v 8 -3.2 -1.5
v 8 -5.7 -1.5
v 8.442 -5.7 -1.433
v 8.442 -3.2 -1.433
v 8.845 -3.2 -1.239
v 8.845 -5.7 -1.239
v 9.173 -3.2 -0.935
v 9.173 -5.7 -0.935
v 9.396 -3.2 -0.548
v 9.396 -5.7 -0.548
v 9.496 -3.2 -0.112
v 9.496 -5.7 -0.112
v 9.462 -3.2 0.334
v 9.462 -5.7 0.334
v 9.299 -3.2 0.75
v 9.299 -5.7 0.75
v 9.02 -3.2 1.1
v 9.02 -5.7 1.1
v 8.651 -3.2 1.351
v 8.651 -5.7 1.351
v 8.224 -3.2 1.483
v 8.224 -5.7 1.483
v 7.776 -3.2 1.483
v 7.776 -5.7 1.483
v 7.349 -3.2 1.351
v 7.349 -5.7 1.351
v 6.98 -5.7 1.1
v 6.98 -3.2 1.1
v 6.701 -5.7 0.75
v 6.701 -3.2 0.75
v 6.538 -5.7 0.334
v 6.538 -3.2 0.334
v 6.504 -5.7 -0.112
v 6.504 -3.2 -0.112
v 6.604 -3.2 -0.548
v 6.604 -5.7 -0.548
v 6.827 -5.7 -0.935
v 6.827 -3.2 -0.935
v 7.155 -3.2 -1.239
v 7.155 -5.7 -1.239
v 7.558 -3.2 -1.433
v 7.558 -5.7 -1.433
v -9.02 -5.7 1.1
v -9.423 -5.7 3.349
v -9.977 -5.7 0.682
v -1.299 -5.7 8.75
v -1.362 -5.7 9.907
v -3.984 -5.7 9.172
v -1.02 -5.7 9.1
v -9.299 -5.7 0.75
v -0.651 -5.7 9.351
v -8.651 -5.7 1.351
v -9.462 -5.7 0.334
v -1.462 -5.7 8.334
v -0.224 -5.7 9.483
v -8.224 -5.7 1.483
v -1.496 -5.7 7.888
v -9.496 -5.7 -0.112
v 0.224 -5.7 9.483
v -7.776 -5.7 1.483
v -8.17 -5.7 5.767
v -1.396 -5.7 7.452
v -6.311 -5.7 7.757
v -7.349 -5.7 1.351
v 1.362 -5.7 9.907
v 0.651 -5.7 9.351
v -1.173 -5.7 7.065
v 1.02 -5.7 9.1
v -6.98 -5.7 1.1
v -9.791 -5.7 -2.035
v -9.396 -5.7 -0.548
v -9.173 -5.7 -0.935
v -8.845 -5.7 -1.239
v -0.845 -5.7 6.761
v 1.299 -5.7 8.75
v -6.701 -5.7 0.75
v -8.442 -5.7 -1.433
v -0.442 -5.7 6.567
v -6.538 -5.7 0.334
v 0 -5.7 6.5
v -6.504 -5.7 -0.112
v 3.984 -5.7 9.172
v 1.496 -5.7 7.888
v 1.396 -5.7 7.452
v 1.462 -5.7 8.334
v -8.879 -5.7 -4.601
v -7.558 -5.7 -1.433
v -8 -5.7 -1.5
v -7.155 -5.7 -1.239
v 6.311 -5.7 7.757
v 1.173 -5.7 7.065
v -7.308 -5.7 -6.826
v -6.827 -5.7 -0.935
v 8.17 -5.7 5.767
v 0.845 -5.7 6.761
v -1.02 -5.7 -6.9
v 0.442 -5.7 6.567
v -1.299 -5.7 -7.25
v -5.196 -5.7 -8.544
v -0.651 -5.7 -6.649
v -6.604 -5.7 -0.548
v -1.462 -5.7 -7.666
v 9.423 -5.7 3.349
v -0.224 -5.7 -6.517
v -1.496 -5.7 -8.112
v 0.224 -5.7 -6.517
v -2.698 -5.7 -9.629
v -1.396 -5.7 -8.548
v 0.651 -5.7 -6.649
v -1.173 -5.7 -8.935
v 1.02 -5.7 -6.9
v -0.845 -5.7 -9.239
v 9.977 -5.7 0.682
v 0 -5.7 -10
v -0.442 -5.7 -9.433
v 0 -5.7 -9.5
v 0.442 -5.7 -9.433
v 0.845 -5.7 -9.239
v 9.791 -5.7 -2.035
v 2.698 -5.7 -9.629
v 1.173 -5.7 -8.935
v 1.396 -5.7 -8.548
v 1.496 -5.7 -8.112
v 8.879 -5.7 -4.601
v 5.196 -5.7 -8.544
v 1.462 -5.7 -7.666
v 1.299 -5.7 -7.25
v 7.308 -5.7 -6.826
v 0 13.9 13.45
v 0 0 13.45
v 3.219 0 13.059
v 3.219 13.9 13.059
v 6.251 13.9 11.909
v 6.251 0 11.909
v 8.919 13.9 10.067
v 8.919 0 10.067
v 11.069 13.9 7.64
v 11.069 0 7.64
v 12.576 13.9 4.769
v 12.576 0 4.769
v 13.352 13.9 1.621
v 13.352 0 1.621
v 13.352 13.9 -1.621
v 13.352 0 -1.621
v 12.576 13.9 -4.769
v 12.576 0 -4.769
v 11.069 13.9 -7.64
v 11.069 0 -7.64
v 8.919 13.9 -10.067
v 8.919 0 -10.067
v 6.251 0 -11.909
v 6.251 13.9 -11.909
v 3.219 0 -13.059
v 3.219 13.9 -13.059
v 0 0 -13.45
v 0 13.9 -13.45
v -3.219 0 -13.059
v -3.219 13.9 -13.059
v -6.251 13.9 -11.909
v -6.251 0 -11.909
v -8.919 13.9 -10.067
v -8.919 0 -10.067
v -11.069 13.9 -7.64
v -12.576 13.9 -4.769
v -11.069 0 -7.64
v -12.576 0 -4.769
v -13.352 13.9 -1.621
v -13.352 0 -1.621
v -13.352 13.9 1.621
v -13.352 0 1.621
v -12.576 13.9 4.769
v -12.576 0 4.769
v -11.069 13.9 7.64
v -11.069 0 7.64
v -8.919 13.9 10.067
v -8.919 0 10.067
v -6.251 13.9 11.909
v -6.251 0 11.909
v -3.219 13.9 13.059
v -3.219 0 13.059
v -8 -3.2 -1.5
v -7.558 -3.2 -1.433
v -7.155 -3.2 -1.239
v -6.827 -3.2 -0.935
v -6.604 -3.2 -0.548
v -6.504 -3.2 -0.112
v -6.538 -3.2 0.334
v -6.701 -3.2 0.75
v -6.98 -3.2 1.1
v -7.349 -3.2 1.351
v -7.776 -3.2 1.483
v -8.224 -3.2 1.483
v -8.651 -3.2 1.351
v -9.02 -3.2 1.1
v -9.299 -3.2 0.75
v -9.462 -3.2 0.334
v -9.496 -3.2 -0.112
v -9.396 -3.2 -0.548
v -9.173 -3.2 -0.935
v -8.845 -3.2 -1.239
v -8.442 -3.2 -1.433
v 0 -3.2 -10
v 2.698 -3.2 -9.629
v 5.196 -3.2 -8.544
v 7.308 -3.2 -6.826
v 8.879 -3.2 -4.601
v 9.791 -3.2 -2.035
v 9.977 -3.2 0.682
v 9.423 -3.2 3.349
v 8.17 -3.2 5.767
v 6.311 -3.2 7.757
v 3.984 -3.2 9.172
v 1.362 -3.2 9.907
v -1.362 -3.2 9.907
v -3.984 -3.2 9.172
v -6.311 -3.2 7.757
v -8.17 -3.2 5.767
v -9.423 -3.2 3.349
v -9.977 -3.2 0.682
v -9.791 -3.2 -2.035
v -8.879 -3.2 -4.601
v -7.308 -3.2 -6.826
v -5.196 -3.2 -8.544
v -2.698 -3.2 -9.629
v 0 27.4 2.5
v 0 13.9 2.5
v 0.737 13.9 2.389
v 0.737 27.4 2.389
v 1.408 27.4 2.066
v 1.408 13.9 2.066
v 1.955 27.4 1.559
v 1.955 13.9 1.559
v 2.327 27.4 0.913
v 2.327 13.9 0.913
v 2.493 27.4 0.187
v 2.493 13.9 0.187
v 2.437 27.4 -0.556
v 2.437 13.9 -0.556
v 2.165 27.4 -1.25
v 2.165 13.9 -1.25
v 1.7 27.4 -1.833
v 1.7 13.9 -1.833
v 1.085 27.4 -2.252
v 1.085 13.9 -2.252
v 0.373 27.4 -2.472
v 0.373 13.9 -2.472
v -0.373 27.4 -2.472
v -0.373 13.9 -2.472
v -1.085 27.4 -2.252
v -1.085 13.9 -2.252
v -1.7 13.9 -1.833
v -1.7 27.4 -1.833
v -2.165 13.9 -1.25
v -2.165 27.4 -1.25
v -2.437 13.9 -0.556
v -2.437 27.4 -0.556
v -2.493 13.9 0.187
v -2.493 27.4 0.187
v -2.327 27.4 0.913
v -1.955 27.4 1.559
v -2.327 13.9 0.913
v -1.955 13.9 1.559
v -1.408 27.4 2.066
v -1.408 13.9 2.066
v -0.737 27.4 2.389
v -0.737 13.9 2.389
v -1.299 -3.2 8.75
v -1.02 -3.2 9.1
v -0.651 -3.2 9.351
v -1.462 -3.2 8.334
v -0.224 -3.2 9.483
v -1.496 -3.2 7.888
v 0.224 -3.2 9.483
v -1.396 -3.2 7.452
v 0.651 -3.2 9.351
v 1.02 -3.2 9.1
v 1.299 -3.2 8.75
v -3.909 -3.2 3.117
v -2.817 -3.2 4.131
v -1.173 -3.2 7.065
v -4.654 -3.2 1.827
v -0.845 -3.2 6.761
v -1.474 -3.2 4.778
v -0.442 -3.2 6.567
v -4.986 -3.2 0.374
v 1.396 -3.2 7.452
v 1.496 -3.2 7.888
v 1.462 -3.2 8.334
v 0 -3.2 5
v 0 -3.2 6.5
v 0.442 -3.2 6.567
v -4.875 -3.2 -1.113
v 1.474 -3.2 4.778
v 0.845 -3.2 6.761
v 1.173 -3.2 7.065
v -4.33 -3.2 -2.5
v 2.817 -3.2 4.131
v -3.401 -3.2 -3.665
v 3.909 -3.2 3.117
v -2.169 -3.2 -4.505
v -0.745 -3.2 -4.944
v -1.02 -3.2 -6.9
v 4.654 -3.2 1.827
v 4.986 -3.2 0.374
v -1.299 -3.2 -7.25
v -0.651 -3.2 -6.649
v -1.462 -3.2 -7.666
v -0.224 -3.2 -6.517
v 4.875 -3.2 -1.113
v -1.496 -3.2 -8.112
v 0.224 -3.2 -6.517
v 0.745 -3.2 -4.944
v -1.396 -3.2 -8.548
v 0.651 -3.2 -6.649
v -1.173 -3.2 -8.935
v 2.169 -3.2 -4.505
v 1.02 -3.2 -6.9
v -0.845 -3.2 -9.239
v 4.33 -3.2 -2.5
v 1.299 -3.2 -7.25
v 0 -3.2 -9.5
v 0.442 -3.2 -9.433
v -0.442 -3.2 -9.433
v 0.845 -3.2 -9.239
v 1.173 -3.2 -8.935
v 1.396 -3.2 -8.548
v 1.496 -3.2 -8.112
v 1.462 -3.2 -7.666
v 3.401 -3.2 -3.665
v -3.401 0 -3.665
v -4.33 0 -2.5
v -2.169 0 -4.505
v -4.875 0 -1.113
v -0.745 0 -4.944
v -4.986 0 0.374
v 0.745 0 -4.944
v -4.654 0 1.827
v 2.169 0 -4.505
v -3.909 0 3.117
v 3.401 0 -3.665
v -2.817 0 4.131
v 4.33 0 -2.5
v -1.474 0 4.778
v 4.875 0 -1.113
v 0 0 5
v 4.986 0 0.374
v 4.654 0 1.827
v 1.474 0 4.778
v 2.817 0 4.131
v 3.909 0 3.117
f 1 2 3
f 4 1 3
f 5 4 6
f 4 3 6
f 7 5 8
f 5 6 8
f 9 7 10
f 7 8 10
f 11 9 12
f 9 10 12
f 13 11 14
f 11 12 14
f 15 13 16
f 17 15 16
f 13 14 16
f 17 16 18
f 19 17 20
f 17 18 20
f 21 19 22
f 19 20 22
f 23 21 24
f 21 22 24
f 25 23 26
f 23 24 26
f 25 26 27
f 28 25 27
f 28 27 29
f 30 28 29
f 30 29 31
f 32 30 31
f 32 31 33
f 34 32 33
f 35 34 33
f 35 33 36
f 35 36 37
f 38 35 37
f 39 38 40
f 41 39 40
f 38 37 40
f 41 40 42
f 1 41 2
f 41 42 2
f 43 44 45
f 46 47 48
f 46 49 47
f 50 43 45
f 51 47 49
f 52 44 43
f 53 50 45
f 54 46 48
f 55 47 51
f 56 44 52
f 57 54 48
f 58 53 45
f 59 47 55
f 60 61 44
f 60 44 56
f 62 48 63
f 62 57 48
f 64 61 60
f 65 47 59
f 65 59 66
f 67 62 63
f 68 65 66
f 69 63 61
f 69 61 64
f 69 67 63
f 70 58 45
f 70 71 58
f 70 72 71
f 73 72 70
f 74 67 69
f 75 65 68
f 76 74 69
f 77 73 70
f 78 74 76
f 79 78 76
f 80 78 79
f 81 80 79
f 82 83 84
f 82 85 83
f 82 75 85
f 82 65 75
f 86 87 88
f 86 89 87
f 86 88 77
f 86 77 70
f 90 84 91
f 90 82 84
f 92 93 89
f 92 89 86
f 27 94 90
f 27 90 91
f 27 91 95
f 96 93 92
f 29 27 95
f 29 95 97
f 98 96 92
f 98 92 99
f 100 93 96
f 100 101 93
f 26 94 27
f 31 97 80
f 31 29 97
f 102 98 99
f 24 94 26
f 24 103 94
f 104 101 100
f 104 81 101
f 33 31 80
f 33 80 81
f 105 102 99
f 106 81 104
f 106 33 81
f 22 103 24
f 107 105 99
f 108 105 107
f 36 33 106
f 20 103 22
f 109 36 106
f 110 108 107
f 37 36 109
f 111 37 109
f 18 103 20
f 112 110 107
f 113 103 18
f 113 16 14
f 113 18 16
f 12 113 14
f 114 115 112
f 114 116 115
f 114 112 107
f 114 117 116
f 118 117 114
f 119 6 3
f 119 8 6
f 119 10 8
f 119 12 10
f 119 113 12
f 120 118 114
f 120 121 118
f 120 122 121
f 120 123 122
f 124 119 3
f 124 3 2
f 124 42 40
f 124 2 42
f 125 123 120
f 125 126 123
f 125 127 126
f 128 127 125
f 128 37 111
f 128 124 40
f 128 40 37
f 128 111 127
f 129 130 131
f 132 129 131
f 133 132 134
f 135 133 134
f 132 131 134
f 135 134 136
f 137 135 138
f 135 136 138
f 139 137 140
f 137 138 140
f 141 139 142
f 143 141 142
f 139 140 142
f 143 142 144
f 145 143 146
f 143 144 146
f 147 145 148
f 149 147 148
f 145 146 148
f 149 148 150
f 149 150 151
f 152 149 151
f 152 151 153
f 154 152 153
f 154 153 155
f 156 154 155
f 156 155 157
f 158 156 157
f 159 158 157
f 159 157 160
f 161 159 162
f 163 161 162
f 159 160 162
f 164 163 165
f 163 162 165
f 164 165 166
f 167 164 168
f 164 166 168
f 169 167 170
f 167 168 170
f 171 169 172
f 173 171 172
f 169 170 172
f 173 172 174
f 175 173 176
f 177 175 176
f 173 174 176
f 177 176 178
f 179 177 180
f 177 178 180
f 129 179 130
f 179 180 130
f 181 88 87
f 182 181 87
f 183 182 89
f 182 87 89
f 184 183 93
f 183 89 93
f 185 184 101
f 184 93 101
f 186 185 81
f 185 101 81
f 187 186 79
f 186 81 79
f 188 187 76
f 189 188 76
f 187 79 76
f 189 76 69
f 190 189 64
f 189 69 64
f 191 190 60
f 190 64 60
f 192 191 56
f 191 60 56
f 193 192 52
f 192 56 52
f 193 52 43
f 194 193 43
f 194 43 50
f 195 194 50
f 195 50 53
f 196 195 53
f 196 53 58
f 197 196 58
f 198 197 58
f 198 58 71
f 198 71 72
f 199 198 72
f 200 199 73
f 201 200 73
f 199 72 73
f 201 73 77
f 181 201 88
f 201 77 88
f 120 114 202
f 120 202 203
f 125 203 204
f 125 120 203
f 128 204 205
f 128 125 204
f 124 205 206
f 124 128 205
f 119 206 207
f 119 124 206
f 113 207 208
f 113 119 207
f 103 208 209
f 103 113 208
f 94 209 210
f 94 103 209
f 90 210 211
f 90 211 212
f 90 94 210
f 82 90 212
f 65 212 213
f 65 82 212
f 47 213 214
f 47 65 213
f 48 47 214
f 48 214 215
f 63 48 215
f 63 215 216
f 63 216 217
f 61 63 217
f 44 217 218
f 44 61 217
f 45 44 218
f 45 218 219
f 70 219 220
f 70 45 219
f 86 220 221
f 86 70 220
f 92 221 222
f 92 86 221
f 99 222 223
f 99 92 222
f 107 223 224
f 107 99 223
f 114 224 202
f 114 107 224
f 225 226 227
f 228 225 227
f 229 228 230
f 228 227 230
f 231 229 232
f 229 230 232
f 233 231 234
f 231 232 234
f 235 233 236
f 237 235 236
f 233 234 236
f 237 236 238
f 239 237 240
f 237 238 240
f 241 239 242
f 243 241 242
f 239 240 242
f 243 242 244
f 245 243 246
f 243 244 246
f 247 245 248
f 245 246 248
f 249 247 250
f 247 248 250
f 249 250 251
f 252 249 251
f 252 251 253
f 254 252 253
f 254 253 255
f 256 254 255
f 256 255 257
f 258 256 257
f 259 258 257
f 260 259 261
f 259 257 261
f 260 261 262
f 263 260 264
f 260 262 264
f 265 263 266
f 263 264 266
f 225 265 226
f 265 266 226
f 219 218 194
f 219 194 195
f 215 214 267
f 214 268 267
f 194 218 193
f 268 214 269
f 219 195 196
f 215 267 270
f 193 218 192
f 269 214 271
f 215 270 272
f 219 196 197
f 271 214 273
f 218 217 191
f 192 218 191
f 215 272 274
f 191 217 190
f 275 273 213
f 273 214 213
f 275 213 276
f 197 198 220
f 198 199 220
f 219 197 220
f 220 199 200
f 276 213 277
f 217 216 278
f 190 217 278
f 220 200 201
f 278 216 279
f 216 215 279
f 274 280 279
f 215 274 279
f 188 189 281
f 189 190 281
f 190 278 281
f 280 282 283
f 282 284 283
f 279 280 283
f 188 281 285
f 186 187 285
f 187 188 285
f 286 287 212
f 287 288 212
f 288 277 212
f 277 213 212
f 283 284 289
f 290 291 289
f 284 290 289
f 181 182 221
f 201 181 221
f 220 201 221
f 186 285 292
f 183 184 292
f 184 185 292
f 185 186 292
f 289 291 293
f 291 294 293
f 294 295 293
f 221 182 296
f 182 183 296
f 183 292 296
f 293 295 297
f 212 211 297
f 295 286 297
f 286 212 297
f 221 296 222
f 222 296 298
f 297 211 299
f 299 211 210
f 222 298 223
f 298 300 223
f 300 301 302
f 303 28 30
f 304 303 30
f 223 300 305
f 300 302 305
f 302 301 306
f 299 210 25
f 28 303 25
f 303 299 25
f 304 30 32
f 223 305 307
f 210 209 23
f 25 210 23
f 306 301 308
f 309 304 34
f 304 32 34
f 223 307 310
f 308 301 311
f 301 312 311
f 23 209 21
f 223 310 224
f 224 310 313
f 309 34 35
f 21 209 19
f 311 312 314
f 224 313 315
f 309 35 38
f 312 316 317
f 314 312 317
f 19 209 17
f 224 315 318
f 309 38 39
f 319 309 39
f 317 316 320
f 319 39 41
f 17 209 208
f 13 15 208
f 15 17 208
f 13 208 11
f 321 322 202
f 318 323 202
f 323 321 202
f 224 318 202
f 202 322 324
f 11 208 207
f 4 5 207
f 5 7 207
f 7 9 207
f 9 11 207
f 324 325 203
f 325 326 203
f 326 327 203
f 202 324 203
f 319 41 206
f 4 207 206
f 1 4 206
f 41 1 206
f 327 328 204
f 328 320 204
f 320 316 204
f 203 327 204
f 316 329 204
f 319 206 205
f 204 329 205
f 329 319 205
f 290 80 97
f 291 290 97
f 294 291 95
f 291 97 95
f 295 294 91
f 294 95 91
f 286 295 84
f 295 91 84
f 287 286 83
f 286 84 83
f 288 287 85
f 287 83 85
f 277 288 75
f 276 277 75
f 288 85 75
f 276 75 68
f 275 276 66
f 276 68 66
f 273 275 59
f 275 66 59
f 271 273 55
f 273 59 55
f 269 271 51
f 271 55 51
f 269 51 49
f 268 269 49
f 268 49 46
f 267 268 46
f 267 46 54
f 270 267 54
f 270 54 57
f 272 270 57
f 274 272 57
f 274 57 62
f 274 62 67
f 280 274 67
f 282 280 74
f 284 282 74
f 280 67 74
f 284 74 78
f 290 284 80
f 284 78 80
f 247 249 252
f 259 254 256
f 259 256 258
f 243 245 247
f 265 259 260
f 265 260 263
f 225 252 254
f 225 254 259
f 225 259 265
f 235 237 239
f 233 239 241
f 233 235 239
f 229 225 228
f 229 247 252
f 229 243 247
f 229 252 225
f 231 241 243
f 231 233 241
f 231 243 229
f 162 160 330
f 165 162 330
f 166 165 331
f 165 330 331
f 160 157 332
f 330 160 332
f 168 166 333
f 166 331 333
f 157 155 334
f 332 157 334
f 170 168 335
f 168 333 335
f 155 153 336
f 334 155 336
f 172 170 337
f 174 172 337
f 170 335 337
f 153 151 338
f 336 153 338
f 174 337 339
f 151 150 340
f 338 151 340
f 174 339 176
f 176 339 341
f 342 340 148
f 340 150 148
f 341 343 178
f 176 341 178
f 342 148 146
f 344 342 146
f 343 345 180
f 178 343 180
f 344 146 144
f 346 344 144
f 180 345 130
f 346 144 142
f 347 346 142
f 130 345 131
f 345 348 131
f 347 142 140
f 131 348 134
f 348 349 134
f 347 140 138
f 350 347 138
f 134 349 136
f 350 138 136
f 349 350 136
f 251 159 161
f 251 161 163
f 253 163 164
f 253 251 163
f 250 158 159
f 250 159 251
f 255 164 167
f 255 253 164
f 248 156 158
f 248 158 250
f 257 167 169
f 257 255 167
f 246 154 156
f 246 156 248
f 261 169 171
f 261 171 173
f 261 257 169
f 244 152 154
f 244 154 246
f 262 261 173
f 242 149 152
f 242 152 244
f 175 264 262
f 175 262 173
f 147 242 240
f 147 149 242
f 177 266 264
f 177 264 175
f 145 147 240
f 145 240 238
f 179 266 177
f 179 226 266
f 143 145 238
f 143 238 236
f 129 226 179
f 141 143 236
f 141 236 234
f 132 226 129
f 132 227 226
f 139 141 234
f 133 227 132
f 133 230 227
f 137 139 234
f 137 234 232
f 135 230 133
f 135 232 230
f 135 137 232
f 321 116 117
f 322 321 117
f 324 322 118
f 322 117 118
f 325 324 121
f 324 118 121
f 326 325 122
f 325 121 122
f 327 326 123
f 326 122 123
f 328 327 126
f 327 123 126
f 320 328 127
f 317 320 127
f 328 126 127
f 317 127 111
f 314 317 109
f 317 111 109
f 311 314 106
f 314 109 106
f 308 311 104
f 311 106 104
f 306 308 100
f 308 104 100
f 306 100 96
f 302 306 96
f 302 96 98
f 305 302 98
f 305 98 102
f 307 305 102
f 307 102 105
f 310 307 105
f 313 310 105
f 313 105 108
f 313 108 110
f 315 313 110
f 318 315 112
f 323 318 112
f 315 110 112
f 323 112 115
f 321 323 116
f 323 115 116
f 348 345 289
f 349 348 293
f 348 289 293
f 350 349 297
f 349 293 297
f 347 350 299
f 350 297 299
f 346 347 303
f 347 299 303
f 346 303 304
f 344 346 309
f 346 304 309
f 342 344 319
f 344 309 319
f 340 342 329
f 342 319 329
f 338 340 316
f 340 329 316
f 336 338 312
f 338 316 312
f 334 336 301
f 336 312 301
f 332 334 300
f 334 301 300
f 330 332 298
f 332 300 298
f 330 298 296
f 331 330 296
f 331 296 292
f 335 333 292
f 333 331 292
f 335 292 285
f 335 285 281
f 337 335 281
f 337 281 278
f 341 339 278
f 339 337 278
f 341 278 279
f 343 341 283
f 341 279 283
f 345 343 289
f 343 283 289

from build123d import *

# Parameters (mm, degrees)
SKETCH1_R           = 13.45
BOSS_EXTRUDE1_DEPTH = 13.9
SKETCH2_R           = 10
SKETCH2_R_2         = 1.5
BOSS_EXTRUDE3_DEPTH = 2.5
BOSS_EXTRUDE4_REACH = 27.578
SKETCH3_R           = 5
SKETCH4_R           = 2.5
BOSS_EXTRUDE5_DEPTH = 13.5


with BuildPart() as part:
    # Sketch1 → Boss-Extrude1 (new body)
    with BuildSketch(Plane(origin=(0, 0, 0), x_dir=(1, 0, 0), z_dir=(0, 1, 0))):
        with Locations(Location((0, 0, 0), (0, 0, 270))):
            Circle(SKETCH1_R)
    extrude(amount=BOSS_EXTRUDE1_DEPTH)

    # Sketch3 → Boss-Extrude4 (add, up to next)
    with BuildSketch(Plane(origin=(0, -3.2, 0), x_dir=(1, 0, 0), z_dir=(0, 1, 0)), mode=Mode.PRIVATE) as boss_extrude4_sk1:
        with Locations(Location((0, 0, 0), (0, 0, 270))):
            Circle(SKETCH3_R)
    boss_extrude4_tool1 = extrude(boss_extrude4_sk1.sketch, amount=BOSS_EXTRUDE4_REACH, mode=Mode.PRIVATE) - part.part


with BuildPart() as body_2:
    # Sketch2 → Boss-Extrude3 (new body)
    with BuildSketch(Plane.XZ.offset(5.7)):
        with Locations(Location((0, 0, 0), (0, 0, 270))):
            Circle(SKETCH2_R)
        with Locations(Location((0, 8, 0), (0, 0, 270))):
            Circle(SKETCH2_R_2, mode=Mode.SUBTRACT)
        with Locations(Location((8, 0, 0), (0, 0, 270))):
            Circle(SKETCH2_R_2, mode=Mode.SUBTRACT)
        with Locations(Location((0, -8, 0), (0, 0, 270))):
            Circle(SKETCH2_R_2, mode=Mode.SUBTRACT)
        with Locations(Location((-8, 0, 0), (0, 0, 270))):
            Circle(SKETCH2_R_2, mode=Mode.SUBTRACT)
    extrude(amount=-BOSS_EXTRUDE3_DEPTH)


with BuildPart() as part_1:
    add(part.part)

    add(body_2.part)  # Boss-Extrude4 merges body 2
    add(boss_extrude4_tool1.solids().sort_by_distance((0, -3.2, 0))[0])

    # Sketch4 → Boss-Extrude5 (add)
    with BuildSketch(Plane(origin=(0, 13.9, 0), x_dir=(1, 0, 0), z_dir=(0, 1, 0))):
        with Locations(Location((0, 0, 0), (0, 0, 270))):
            Circle(SKETCH4_R)
    extrude(amount=BOSS_EXTRUDE5_DEPTH)


solid = part_1.part
